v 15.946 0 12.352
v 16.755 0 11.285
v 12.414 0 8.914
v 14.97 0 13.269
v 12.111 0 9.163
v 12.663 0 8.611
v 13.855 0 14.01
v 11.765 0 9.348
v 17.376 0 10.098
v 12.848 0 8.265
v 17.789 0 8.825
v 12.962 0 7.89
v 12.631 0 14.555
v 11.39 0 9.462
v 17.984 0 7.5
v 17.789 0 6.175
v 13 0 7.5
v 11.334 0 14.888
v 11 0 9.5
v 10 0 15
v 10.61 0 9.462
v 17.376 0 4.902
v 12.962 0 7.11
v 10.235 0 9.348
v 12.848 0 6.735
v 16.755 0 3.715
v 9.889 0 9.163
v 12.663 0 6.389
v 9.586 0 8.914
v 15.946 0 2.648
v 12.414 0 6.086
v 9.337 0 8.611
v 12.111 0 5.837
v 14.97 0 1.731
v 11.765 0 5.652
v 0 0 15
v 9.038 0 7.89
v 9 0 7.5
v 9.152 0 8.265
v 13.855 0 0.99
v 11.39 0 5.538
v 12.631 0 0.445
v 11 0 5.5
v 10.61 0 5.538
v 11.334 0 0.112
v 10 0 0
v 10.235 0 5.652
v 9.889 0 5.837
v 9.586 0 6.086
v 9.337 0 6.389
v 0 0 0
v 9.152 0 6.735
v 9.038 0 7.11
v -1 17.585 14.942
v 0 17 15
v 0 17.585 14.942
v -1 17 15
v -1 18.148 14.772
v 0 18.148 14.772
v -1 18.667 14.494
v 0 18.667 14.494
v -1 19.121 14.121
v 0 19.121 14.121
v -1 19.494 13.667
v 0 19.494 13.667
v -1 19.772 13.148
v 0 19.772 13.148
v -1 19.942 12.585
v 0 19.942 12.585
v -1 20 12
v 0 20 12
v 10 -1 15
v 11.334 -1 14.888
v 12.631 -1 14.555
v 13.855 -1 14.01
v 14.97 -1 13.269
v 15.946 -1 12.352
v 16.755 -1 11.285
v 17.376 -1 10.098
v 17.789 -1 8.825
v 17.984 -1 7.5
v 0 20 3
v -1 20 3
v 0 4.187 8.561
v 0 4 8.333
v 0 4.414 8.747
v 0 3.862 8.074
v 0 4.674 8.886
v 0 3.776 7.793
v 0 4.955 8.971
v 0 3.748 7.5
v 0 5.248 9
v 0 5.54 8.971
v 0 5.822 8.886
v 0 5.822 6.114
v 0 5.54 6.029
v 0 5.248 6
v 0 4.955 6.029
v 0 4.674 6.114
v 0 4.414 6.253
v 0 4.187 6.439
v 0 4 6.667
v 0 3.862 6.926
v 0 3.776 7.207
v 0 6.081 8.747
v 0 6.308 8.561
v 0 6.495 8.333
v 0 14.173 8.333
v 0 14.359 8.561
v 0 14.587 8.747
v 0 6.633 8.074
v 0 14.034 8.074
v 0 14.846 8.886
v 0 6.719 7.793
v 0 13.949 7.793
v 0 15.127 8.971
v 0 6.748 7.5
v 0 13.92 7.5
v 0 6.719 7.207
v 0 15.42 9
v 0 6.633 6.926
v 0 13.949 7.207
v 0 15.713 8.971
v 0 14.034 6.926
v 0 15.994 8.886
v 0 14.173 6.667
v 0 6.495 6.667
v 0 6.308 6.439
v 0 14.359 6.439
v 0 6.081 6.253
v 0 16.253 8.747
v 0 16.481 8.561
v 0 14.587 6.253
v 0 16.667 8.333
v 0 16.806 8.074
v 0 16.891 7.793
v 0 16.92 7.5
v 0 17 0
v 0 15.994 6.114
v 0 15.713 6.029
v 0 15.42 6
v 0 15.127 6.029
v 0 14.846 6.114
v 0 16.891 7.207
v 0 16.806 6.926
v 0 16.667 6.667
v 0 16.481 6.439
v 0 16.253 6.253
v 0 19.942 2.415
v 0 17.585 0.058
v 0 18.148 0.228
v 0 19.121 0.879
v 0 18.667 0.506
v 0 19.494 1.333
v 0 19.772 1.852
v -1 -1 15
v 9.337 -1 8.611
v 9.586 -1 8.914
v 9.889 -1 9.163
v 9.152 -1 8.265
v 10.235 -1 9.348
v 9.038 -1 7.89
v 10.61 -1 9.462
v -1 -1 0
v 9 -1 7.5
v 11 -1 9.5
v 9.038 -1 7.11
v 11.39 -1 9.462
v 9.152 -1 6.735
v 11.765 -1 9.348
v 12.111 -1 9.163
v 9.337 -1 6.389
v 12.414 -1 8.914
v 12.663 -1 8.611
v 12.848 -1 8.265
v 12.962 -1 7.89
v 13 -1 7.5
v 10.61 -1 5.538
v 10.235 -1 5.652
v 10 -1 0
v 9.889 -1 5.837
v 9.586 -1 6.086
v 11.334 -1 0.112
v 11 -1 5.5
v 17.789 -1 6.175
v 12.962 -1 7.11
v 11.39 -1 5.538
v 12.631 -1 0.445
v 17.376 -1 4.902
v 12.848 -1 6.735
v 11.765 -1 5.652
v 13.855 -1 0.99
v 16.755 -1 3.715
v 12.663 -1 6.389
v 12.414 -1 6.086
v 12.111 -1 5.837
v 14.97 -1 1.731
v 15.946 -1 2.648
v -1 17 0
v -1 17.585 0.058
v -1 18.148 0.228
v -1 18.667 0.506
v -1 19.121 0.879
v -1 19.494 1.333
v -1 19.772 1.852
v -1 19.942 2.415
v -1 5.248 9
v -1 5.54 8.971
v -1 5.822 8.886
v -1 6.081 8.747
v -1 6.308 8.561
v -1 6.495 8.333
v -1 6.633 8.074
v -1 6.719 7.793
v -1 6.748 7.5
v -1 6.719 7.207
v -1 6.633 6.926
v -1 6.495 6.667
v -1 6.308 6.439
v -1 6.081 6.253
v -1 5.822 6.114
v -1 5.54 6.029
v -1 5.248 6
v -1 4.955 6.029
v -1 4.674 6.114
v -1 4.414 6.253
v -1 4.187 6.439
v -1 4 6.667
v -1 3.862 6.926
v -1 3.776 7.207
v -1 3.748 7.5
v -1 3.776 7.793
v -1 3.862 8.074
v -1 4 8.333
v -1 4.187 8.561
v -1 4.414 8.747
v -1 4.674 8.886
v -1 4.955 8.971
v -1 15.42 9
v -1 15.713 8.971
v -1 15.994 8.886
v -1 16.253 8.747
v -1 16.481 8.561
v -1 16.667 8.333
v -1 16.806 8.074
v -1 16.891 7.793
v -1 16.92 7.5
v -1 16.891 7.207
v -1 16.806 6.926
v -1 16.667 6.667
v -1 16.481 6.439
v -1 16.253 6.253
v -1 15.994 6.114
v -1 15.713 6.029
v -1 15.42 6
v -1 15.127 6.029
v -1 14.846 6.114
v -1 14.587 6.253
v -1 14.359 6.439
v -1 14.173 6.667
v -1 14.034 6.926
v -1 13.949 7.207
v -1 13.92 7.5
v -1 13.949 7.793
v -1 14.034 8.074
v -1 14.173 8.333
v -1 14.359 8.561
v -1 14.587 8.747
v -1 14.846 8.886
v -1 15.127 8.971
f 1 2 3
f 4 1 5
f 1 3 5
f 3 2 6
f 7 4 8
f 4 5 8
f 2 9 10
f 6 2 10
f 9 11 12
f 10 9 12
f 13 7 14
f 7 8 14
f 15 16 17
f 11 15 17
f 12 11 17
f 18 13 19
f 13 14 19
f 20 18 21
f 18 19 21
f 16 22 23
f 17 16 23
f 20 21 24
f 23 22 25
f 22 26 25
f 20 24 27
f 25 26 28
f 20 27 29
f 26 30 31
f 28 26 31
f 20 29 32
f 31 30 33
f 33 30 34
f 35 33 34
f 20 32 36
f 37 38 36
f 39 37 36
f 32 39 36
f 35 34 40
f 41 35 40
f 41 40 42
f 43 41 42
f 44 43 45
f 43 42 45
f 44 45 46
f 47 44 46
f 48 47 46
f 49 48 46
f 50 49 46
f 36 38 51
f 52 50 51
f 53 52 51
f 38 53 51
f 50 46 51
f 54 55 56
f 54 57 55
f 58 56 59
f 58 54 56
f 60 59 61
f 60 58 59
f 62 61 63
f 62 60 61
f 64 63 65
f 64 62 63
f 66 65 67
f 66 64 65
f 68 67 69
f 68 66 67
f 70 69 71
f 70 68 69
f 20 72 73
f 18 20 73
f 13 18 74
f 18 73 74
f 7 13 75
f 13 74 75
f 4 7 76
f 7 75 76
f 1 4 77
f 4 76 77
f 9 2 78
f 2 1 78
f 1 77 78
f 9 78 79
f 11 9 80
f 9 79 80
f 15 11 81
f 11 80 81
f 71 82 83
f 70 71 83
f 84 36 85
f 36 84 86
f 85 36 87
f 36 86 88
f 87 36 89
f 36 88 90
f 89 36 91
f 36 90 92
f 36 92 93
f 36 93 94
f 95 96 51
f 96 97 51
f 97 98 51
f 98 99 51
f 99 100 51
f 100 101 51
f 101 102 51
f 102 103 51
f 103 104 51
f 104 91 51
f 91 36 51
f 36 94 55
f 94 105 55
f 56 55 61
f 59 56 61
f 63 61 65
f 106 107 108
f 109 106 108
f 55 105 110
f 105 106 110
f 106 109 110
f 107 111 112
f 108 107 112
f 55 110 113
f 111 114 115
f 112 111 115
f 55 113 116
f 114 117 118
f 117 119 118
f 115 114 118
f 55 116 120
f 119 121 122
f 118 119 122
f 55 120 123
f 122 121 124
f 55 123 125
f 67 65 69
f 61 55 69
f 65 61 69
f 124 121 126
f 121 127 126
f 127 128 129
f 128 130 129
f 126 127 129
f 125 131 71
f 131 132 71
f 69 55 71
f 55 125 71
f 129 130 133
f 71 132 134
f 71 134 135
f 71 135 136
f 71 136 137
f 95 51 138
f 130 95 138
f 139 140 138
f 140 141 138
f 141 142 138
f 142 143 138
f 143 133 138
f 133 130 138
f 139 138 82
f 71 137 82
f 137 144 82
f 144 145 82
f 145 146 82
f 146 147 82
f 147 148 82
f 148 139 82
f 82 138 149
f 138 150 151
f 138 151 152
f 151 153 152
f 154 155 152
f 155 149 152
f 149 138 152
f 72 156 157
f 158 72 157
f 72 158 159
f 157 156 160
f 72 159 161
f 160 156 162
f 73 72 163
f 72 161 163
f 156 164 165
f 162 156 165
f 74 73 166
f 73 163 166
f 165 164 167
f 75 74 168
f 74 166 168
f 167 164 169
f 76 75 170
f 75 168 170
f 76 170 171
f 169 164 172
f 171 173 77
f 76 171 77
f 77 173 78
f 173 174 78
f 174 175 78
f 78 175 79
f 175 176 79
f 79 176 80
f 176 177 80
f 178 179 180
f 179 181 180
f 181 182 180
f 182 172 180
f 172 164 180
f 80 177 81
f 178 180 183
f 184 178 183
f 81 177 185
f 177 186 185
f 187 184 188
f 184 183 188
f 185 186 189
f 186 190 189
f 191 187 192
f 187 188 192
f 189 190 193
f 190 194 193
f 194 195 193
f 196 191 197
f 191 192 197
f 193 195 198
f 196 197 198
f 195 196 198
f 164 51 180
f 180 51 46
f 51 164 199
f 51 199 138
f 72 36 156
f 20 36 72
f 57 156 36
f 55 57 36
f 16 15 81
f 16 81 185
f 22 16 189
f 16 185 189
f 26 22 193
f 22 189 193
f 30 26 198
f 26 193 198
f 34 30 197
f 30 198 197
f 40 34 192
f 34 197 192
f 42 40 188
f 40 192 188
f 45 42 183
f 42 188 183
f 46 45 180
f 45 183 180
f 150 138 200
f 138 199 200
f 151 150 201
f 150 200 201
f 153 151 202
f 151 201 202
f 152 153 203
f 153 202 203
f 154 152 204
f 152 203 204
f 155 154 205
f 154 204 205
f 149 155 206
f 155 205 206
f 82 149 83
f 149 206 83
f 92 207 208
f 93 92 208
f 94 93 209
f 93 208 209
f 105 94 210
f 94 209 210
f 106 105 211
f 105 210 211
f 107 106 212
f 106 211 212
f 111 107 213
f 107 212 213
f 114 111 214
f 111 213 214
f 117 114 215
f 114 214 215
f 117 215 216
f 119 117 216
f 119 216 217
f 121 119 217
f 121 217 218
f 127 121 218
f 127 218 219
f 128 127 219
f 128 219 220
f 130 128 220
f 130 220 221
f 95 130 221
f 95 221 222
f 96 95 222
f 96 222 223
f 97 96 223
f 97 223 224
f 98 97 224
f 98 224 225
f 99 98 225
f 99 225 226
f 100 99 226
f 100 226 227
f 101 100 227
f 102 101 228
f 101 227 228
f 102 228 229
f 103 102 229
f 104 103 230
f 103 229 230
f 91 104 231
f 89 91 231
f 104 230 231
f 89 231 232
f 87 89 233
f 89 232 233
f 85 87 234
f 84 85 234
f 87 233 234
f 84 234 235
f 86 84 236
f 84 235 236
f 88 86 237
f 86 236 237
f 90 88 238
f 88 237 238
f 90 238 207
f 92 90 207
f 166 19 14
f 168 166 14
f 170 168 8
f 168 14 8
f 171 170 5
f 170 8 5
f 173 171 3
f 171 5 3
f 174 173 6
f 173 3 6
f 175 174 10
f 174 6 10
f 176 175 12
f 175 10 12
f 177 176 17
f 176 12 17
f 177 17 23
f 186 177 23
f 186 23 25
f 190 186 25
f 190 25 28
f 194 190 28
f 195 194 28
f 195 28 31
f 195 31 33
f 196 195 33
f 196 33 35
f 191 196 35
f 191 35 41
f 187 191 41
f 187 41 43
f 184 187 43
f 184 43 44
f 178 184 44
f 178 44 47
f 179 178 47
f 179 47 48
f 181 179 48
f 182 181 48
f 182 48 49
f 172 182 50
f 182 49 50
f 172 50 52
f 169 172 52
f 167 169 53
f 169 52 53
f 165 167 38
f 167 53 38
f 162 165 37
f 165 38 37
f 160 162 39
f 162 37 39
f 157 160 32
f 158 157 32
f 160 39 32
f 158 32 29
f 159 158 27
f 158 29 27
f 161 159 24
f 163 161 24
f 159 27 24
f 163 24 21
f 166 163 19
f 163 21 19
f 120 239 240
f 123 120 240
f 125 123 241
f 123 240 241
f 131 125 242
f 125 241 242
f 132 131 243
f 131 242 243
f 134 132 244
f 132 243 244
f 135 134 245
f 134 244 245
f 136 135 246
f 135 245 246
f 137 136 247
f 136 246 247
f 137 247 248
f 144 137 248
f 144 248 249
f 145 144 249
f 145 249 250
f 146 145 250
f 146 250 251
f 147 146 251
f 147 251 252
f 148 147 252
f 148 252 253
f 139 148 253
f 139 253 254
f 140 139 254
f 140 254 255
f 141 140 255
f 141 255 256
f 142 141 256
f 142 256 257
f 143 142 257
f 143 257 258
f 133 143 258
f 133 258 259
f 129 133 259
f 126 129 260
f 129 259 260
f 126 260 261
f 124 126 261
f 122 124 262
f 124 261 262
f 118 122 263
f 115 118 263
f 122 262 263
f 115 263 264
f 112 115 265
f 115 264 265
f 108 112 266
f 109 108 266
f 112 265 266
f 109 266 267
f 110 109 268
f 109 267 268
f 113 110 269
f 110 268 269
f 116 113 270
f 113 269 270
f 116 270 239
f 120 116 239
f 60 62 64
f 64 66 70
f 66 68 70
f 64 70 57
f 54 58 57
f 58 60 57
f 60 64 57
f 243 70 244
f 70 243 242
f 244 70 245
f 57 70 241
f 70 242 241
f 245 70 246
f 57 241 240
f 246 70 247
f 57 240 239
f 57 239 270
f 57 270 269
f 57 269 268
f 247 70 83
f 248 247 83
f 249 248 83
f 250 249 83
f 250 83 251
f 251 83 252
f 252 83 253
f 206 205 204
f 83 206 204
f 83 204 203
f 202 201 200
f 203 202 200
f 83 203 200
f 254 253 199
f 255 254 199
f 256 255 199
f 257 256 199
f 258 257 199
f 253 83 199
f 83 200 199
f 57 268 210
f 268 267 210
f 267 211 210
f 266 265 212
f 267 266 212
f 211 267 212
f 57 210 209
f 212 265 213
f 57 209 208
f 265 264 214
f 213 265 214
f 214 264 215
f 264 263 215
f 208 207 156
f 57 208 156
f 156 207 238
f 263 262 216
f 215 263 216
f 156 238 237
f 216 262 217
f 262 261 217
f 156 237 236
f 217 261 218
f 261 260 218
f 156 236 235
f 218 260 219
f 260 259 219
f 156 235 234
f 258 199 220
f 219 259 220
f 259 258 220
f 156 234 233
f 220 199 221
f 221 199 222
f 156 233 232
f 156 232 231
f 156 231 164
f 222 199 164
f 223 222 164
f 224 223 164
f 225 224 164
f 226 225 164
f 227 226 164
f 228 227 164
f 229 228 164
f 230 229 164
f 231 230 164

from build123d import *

# Parameters (mm, degrees)
EXTRUDE_THIN1_DEPTH = 15
FILLET1_R           = 8
SKETCH2_R           = 1.5
CUT_EXTRUDE1_DEPTH  = 32.391175729
FILLET2_R           = 3
SKETCH3_R           = 2
CUT_EXTRUDE2_DEPTH  = 31.796707523


with BuildPart() as part:
    # Sketch1 → Extrude-Thin1 (new body)
    with BuildSketch(Plane.XY):
        Polygon((18, 0), (0, 0), (0, 20), (-1, 20), (-1, -1), (18, -1), align=None)
    extrude(amount=EXTRUDE_THIN1_DEPTH)

    # Fillet1
    # the kernel refuses this fillet: 8 mm, written as the material it takes off along each edge
    with BuildSketch(Plane(origin=(18, -21, 0), x_dir=(0, 0, 1), z_dir=(0, 1, 0))) as fillet1_piece_1:
        with BuildLine():
            CenterArc((FILLET1_R, -FILLET1_R), FILLET1_R, 90, 90)
            Line((0, -FILLET1_R), (0, 0))
            Line((0, 0), (FILLET1_R, 0))
        make_face()
    extrude(amount=41, mode=Mode.SUBTRACT)
    with BuildSketch(Plane(origin=(18, -21, 15), x_dir=(0, 0, -1), z_dir=(0, 1, 0))) as fillet1_piece_2:
        with BuildLine():
            CenterArc((FILLET1_R, FILLET1_R), FILLET1_R, 180, 90)
            Line((0, FILLET1_R), (0, 0))
            Line((0, 0), (FILLET1_R, 0))
        make_face()
    extrude(amount=41, mode=Mode.SUBTRACT)

    # Sketch2 → Cut-Extrude1 (cut, through all)
    with BuildSketch(Plane.ZY.offset(1)):
        with Locations((7.5, 5.247627846)):
            Circle(SKETCH2_R)
        with Locations((7.5, 15.420132795)):
            Circle(SKETCH2_R)
    extrude(amount=-CUT_EXTRUDE1_DEPTH, mode=Mode.SUBTRACT)

    # Fillet2
    fillet2_edges = [part.edges().sort_by_distance(p)[0] for p in [
        (-0.5, 20, 15),
        (-0.5, 20, 0),
    ]]
    fillet(fillet2_edges, radius=FILLET2_R)

    # Sketch3 → Cut-Extrude2 (cut, through all)
    with BuildSketch(Plane(origin=(0, 0, 0), x_dir=(1, 0, 0), z_dir=(0, 1, 0))):
        with Locations(Location((11, -7.5, 0), (0, 0, 270))):
            Circle(SKETCH3_R)
    extrude(amount=-CUT_EXTRUDE2_DEPTH, mode=Mode.SUBTRACT)


solid = part.part
